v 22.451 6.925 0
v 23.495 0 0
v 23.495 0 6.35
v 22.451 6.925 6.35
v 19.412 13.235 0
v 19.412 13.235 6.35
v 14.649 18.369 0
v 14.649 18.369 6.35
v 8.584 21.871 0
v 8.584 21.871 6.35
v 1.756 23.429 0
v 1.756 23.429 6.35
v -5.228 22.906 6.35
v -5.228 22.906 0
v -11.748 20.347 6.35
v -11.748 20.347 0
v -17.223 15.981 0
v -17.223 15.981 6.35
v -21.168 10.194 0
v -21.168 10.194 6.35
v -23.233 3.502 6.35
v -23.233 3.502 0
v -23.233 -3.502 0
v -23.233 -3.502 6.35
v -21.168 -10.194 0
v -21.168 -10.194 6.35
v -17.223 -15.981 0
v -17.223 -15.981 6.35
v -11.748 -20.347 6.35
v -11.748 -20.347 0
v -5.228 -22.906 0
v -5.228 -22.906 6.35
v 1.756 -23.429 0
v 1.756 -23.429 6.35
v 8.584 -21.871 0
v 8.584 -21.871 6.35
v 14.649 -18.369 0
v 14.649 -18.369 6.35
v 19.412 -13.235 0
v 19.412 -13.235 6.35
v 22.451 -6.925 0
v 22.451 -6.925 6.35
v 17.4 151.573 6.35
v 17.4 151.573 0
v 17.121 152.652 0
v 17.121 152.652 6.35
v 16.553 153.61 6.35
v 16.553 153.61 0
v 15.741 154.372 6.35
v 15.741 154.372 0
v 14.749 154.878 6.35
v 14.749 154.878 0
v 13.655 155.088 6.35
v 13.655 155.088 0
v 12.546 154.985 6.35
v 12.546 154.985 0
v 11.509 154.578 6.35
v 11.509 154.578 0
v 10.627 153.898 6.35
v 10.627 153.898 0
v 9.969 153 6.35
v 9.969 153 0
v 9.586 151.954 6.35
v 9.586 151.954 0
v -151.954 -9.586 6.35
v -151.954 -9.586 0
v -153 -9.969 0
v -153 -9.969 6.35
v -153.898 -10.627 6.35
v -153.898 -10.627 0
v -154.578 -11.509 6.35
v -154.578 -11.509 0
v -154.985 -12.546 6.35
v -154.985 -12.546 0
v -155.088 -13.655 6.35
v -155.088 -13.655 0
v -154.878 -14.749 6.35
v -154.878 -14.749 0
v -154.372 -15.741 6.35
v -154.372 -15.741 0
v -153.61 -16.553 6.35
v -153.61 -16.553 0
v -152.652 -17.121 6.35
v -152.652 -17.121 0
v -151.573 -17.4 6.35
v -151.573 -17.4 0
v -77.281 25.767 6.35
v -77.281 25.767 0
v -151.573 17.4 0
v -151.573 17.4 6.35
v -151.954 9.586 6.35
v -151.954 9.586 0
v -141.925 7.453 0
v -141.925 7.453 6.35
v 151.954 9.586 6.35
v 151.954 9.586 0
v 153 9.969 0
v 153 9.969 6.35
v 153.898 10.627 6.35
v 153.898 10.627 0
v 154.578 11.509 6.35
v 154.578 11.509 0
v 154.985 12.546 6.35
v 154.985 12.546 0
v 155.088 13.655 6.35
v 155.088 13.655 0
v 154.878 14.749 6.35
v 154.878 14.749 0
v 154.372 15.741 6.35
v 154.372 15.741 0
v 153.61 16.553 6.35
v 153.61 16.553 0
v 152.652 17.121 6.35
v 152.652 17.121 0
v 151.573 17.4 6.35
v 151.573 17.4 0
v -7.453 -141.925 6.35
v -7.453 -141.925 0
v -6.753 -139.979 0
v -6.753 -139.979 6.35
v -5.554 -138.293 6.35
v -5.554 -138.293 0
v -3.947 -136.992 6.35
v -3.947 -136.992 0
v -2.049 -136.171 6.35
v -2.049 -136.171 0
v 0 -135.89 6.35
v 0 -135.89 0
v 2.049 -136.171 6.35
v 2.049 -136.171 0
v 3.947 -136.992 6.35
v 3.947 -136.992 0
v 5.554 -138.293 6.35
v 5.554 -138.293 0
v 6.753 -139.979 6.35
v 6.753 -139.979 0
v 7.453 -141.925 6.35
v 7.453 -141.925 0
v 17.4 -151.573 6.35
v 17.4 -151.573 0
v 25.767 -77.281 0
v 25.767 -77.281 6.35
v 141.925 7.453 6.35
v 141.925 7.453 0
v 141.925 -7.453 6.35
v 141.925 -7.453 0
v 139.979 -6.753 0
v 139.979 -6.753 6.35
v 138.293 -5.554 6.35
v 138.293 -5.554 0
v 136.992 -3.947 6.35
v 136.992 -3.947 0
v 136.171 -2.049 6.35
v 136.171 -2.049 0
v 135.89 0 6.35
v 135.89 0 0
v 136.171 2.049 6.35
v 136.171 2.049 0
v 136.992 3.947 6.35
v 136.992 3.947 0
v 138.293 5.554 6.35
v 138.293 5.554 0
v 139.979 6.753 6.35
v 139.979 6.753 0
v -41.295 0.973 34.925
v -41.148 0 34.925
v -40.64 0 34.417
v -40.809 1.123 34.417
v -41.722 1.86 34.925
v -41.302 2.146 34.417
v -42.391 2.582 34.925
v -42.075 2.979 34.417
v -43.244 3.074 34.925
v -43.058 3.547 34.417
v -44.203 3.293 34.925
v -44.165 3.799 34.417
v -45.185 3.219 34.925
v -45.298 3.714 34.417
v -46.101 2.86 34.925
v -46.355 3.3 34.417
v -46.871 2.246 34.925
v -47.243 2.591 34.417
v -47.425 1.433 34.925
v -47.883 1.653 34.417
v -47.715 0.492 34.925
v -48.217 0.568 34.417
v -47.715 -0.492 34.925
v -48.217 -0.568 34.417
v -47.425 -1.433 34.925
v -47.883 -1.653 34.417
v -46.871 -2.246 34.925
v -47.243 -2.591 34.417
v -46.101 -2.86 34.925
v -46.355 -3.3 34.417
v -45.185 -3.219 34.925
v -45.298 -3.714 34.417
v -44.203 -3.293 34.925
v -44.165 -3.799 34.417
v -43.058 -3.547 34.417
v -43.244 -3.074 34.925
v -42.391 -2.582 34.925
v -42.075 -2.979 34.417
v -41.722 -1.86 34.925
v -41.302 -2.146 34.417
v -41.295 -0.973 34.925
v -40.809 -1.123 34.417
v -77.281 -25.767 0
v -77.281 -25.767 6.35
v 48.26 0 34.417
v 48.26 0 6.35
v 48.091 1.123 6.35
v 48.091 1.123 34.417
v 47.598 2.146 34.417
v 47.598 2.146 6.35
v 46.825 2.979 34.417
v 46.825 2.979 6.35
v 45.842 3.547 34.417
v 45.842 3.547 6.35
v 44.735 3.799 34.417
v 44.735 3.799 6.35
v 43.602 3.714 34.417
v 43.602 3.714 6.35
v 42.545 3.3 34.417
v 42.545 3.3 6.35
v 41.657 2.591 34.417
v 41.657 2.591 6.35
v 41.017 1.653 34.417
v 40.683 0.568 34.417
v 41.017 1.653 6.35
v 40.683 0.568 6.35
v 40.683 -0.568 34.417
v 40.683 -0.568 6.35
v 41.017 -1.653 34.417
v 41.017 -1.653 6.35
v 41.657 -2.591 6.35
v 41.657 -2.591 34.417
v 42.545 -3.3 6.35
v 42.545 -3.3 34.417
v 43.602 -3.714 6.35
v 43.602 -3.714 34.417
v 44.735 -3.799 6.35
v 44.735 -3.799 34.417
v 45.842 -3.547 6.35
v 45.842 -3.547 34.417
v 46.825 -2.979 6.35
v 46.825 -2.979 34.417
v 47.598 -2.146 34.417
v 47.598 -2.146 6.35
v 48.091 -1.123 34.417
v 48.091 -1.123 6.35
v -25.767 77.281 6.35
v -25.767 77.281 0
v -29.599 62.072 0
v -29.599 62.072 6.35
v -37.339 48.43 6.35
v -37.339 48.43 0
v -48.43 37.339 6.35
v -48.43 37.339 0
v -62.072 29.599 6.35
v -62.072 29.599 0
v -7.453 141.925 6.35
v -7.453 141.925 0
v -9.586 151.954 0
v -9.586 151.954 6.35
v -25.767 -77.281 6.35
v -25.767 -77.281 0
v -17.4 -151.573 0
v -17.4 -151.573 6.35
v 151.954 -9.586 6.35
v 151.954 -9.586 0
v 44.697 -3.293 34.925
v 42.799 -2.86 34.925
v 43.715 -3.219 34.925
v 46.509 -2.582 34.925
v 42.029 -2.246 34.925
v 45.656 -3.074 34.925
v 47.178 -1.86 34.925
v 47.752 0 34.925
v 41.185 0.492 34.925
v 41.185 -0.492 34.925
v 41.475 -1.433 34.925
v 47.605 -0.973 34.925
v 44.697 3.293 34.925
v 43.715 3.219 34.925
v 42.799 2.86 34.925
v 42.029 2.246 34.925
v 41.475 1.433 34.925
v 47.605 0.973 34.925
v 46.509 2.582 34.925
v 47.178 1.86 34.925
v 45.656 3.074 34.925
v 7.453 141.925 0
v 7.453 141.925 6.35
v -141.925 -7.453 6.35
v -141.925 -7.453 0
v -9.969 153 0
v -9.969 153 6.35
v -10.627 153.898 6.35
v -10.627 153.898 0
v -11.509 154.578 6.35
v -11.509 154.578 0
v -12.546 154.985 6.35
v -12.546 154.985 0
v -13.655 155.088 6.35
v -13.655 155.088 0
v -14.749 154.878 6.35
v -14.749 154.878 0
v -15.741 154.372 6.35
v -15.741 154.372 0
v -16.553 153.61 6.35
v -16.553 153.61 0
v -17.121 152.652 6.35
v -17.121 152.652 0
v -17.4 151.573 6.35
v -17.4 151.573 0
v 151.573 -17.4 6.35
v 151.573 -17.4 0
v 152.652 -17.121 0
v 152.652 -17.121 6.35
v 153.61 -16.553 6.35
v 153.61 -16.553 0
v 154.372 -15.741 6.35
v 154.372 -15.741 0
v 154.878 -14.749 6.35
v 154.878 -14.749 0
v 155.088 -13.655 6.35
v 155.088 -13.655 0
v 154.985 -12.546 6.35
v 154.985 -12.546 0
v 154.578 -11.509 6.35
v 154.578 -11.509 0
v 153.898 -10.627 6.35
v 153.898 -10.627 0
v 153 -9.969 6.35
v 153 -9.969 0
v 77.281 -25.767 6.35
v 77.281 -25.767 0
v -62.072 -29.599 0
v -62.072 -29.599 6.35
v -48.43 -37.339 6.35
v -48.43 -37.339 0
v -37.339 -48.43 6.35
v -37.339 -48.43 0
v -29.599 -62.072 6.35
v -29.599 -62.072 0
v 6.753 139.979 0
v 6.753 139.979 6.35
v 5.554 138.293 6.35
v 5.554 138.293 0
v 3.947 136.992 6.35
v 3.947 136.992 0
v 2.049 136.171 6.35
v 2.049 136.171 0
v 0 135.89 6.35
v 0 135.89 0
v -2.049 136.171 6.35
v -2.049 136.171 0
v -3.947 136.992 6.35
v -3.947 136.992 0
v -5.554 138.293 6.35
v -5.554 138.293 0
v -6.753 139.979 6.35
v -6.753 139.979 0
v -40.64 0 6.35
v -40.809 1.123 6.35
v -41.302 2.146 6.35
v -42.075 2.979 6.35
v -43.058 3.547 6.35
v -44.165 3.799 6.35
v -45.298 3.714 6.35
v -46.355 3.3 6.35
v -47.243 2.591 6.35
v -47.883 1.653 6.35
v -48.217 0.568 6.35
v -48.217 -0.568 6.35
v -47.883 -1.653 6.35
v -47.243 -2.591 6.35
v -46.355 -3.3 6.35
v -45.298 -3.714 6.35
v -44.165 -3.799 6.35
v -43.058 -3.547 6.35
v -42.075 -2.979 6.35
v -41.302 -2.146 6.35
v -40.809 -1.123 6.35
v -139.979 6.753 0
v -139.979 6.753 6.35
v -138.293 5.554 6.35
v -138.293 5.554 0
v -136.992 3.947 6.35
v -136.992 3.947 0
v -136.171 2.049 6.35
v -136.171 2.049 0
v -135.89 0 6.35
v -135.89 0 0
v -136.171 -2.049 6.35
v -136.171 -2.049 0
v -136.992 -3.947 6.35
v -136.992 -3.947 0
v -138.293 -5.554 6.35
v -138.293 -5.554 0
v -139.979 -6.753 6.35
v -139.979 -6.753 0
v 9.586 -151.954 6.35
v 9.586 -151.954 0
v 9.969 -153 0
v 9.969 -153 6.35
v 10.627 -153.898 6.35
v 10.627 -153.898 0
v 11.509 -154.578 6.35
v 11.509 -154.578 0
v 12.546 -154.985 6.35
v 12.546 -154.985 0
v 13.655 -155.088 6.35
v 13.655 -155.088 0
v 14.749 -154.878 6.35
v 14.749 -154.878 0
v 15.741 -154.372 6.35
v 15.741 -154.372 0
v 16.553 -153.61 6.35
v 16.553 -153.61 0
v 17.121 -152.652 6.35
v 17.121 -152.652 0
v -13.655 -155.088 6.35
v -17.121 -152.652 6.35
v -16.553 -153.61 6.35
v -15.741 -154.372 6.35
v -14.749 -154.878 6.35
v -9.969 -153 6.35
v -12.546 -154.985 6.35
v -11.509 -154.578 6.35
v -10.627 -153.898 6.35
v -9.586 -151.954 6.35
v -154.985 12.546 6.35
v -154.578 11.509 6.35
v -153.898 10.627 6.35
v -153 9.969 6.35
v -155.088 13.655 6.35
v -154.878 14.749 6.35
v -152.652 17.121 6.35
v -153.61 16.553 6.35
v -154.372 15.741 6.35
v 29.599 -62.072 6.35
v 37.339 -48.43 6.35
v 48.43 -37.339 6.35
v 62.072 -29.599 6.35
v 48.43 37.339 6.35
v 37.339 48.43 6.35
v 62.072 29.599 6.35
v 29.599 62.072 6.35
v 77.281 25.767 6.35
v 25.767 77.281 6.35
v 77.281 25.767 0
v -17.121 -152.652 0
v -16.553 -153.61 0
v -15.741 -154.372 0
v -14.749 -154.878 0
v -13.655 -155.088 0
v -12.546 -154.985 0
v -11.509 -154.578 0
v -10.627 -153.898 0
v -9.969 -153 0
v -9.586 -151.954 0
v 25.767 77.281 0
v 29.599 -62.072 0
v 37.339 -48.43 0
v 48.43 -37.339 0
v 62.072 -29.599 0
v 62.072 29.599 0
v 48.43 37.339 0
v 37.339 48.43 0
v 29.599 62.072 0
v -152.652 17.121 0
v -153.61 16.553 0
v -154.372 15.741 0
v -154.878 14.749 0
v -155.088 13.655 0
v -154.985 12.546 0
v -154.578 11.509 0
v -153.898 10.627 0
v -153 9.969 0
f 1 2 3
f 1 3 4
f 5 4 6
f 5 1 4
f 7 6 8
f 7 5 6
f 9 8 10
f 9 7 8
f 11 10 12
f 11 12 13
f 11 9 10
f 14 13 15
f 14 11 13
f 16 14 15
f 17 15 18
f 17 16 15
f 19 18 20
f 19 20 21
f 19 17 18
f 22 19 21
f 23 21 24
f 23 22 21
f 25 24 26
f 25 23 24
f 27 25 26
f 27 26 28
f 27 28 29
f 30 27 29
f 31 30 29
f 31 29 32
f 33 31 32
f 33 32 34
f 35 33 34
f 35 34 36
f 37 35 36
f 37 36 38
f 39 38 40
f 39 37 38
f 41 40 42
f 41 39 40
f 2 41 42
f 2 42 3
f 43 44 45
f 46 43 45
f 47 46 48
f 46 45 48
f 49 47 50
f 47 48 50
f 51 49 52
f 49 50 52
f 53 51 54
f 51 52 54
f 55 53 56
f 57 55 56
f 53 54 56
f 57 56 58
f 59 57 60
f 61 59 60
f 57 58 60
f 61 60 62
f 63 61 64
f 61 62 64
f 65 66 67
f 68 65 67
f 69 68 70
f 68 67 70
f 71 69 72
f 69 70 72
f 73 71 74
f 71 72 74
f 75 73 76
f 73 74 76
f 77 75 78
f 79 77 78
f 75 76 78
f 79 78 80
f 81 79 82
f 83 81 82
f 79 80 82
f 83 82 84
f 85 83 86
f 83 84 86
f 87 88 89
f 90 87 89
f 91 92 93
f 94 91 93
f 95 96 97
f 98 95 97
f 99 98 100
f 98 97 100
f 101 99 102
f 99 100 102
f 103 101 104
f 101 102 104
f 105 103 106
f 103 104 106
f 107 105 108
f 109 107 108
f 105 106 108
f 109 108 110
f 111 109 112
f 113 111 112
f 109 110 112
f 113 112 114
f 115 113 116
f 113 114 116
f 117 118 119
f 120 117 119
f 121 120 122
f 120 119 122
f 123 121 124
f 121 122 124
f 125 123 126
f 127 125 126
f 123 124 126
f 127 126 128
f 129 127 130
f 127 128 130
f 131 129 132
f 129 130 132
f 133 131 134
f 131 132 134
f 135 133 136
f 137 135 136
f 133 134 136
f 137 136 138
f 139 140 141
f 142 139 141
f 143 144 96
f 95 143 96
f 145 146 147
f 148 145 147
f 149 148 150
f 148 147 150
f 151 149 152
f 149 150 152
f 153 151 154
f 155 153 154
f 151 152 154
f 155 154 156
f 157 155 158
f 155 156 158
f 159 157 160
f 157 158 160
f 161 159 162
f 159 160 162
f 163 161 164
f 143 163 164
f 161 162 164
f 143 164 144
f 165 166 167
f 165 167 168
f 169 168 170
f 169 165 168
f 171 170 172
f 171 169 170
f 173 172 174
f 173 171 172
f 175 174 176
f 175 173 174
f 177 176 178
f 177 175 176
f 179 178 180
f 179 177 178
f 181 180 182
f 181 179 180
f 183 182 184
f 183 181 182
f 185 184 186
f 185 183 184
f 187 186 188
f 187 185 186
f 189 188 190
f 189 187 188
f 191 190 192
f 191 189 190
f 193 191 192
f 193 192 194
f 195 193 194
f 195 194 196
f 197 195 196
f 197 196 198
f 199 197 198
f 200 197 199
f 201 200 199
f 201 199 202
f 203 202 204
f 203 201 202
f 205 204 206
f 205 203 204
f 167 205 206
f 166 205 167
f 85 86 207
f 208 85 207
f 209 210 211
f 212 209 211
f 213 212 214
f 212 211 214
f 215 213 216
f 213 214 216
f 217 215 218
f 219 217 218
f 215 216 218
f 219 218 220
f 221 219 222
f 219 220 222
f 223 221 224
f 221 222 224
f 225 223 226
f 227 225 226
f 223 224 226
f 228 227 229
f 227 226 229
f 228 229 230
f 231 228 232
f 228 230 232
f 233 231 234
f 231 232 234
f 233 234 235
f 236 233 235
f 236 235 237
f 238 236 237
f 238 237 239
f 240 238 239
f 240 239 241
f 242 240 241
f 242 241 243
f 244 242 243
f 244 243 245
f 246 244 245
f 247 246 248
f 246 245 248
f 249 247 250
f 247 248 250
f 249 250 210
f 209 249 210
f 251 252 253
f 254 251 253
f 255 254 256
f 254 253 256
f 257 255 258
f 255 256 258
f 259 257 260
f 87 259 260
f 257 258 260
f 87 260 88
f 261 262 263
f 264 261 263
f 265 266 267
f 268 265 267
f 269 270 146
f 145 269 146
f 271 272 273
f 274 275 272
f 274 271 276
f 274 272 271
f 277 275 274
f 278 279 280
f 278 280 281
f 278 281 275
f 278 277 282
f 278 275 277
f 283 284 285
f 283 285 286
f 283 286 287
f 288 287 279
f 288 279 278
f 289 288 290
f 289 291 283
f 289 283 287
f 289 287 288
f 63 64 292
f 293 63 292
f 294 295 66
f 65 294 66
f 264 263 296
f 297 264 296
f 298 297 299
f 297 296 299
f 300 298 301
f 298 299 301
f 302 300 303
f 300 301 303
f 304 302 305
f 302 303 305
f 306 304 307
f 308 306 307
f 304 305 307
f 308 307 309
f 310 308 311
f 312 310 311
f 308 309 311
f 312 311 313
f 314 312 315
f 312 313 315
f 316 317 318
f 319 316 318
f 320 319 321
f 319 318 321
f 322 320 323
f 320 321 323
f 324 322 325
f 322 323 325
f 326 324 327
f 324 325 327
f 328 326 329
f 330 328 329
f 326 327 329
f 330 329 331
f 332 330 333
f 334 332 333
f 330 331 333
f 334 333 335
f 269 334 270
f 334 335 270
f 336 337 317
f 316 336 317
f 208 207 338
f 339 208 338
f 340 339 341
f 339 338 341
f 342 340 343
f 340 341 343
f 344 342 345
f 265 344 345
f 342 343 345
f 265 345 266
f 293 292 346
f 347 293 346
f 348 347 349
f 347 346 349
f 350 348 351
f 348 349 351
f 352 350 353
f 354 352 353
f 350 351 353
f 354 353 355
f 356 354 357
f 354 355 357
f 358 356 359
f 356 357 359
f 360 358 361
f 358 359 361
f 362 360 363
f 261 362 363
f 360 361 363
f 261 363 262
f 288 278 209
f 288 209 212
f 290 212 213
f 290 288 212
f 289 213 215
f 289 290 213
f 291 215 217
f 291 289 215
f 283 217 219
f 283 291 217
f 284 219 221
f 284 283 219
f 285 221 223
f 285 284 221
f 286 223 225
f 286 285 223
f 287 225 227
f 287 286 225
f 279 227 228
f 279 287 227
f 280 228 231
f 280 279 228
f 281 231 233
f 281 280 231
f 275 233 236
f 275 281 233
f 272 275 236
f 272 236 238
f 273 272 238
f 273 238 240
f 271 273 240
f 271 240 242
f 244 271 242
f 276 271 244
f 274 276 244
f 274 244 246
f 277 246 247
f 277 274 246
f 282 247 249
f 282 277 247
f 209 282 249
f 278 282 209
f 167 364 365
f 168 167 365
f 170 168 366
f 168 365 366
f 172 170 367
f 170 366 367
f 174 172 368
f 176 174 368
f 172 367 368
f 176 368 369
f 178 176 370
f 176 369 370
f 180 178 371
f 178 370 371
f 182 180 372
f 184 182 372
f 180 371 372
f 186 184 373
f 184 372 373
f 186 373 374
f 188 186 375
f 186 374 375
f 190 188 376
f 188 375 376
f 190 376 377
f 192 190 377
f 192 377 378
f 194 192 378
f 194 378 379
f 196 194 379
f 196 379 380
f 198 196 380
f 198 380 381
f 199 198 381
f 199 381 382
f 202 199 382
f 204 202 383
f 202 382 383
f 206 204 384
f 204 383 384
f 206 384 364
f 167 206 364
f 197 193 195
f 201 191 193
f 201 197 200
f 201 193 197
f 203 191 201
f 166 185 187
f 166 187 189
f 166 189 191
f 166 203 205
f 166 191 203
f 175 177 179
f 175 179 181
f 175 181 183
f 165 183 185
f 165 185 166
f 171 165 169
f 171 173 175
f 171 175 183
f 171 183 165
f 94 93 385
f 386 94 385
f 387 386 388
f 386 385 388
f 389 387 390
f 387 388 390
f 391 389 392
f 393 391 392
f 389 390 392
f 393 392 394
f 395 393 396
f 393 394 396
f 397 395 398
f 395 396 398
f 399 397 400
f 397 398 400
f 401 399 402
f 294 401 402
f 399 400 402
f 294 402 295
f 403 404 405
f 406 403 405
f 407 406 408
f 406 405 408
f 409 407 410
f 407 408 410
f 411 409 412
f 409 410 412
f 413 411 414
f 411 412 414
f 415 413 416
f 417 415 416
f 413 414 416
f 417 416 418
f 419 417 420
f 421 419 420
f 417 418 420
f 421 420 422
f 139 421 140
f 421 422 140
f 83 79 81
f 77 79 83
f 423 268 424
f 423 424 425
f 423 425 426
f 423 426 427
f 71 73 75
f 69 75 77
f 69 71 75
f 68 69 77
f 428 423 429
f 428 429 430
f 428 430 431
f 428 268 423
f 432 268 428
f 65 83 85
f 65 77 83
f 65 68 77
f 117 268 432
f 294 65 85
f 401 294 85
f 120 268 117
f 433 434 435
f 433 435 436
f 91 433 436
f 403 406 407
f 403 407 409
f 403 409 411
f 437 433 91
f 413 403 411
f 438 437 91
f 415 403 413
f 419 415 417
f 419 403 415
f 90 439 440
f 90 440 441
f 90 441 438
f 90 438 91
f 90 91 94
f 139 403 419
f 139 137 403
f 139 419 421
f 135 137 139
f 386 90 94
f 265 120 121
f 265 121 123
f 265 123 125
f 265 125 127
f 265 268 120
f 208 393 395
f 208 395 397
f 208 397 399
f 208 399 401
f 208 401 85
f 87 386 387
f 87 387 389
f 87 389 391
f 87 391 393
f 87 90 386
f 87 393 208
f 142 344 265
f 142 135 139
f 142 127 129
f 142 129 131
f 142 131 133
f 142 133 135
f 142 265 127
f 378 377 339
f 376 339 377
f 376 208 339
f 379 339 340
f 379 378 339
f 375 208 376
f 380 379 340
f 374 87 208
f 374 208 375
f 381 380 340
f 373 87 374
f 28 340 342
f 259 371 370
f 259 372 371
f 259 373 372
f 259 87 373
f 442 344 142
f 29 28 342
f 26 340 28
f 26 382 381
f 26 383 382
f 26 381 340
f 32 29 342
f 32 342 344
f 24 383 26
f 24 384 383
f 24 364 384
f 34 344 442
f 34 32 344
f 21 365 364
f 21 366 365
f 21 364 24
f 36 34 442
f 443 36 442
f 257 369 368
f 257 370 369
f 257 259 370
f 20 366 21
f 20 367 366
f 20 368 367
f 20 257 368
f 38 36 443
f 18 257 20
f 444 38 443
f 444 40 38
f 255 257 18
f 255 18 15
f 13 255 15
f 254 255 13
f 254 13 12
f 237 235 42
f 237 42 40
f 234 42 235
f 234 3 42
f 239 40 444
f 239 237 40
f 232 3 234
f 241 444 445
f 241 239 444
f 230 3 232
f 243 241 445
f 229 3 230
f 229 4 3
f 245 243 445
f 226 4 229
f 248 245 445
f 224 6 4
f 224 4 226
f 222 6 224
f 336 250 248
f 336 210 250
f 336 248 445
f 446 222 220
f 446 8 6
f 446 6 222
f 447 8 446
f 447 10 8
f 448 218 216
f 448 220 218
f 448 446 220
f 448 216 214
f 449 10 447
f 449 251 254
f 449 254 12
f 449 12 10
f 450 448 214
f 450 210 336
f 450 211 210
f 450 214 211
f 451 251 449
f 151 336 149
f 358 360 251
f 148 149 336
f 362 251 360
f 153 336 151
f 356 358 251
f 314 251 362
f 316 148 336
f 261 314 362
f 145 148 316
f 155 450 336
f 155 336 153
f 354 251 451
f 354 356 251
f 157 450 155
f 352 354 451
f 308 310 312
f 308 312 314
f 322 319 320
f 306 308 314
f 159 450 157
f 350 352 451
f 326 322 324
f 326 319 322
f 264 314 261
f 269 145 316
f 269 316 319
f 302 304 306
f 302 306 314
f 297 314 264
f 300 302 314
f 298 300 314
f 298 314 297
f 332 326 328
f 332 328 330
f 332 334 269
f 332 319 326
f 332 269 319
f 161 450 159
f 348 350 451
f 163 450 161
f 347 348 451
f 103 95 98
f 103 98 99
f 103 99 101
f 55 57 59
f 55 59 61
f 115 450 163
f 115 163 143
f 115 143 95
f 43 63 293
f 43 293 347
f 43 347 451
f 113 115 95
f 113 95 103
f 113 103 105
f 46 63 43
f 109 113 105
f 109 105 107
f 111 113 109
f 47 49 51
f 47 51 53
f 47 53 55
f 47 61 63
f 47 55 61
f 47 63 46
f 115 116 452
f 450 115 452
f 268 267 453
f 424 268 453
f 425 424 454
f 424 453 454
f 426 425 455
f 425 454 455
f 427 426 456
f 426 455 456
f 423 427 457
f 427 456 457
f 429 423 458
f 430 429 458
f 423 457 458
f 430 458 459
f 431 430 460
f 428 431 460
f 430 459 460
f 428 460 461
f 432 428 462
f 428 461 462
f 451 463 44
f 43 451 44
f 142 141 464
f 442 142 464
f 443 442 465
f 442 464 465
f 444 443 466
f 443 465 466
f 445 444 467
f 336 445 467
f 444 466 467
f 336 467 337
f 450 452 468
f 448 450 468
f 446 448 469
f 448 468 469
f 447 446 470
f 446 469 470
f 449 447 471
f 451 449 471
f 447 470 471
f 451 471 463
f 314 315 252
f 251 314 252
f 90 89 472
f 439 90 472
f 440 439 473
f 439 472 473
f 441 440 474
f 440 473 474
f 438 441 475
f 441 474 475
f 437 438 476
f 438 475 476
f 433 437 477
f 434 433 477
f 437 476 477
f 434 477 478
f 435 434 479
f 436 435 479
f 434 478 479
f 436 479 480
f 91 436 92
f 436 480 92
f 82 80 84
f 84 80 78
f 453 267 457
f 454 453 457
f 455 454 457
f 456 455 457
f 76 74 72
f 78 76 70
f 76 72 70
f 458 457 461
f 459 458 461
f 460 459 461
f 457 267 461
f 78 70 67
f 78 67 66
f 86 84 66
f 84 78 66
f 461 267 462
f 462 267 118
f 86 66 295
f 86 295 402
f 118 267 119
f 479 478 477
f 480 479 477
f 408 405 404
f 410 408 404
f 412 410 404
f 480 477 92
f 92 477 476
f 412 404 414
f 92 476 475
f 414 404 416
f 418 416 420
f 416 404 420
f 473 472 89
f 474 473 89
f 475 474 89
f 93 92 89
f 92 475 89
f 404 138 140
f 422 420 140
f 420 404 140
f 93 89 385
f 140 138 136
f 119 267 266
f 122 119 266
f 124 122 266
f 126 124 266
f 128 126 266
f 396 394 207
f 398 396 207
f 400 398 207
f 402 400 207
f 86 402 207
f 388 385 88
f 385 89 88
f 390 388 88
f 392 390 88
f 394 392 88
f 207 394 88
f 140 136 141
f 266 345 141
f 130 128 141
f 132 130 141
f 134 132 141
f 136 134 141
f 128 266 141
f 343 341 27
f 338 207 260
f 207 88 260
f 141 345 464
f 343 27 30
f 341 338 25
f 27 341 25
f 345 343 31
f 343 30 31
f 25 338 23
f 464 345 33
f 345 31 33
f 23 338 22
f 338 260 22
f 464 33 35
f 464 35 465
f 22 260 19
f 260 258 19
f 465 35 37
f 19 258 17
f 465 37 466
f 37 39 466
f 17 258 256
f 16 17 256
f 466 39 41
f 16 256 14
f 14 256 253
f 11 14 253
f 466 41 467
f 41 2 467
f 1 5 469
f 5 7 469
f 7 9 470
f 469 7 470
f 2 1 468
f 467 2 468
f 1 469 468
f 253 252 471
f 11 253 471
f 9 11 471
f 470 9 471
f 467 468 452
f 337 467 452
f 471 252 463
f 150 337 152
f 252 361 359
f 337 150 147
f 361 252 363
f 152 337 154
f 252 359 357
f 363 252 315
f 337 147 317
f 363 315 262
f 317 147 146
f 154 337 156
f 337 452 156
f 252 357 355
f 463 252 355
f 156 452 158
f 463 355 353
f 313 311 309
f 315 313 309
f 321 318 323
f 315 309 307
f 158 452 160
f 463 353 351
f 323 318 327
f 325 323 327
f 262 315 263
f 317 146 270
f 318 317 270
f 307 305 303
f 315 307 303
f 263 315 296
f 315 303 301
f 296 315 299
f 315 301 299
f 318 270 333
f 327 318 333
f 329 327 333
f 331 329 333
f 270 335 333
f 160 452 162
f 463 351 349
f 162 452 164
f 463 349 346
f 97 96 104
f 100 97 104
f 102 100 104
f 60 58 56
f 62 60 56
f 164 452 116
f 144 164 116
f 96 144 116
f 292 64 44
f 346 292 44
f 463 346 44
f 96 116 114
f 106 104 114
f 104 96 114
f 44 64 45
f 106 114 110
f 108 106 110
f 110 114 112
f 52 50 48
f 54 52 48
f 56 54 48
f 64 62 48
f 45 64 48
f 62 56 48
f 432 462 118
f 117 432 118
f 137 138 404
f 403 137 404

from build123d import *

# Parameters (mm, degrees)
F0_R     = 23.495
F1_DEPTH = 6.35
F2_R     = 3.81
F3_DEPTH = 28.575
F4_SIZE  = 0.508


with BuildPart() as f1:
    # F0 (on Top) → F1 (new body)
    with BuildSketch(Plane.XY):
        with BuildLine():
            ThreePointArc((-141.924887, 7.453309), (-135.89, 0), (-141.924887, -7.453309))
            Line((-141.924887, -7.453309), (-151.954259, -9.586279))
            ThreePointArc((-151.954259, -9.586279), (-155.087703, -13.654877), (-151.573483, -17.399504))
            Line((-151.573483, -17.399504), (-77.281462, -25.767059))
            ThreePointArc((-77.281462, -25.767059), (-42.510822, -42.510822), (-25.767059, -77.281462))
            Line((-25.767059, -77.281462), (-17.399504, -151.573483))
            ThreePointArc((-17.399504, -151.573483), (-13.654877, -155.087703), (-9.586279, -151.954259))
            Line((-9.586279, -151.954259), (-7.453309, -141.924887))
            ThreePointArc((-7.453309, -141.924887), (0, -135.89), (7.453309, -141.924887))
            Line((7.453309, -141.924887), (9.586279, -151.954259))
            ThreePointArc((9.586279, -151.954259), (13.654877, -155.087703), (17.399504, -151.573483))
            Line((17.399504, -151.573483), (25.767059, -77.281462))
            ThreePointArc((25.767059, -77.281462), (42.510822, -42.510822), (77.281462, -25.767059))
            Line((77.281462, -25.767059), (151.573483, -17.399504))
            ThreePointArc((151.573483, -17.399504), (155.087703, -13.654877), (151.954259, -9.586279))
            Line((151.954259, -9.586279), (141.924887, -7.453309))
            ThreePointArc((141.924887, -7.453309), (135.89, 0), (141.924887, 7.453309))
            Line((141.924887, 7.453309), (151.954259, 9.586279))
            ThreePointArc((151.954259, 9.586279), (155.087703, 13.654877), (151.573483, 17.399504))
            Line((151.573483, 17.399504), (77.281462, 25.767059))
            ThreePointArc((77.281462, 25.767059), (42.510822, 42.510822), (25.767059, 77.281462))
            Line((25.767059, 77.281462), (17.399504, 151.573483))
            ThreePointArc((17.399504, 151.573483), (13.654877, 155.087703), (9.586279, 151.954259))
            Line((9.586279, 151.954259), (7.453309, 141.924887))
            ThreePointArc((7.453309, 141.924887), (0, 135.89), (-7.453309, 141.924887))
            Line((-7.453309, 141.924887), (-9.586279, 151.954259))
            ThreePointArc((-9.586279, 151.954259), (-13.654877, 155.087703), (-17.399504, 151.573483))
            Line((-17.399504, 151.573483), (-25.767059, 77.281462))
            ThreePointArc((-25.767059, 77.281462), (-42.510822, 42.510822), (-77.281462, 25.767059))
            Line((-77.281462, 25.767059), (-151.573483, 17.399504))
            ThreePointArc((-151.573483, 17.399504), (-155.087703, 13.654877), (-151.954259, 9.586279))
            Line((-151.954259, 9.586279), (-141.924887, 7.453309))
        make_face()
        Circle(F0_R, mode=Mode.SUBTRACT)
    extrude(amount=F1_DEPTH)

    # F2 (on face) → F3 (join)
    with BuildSketch(Plane.XY.offset(6.35)):
        with Locations((-44.45, 0)):
            Circle(F2_R)
        with Locations((44.45, 0)):
            Circle(F2_R)
    extrude(amount=F3_DEPTH)

    # F4
    f4_edges = [f1.edges().sort_by_distance(p)[0] for p in [
        (-48.26, 0, 34.925),
        (40.64, 0, 34.925),
    ]]
    chamfer(f4_edges, length=F4_SIZE)


solid = f1.part
